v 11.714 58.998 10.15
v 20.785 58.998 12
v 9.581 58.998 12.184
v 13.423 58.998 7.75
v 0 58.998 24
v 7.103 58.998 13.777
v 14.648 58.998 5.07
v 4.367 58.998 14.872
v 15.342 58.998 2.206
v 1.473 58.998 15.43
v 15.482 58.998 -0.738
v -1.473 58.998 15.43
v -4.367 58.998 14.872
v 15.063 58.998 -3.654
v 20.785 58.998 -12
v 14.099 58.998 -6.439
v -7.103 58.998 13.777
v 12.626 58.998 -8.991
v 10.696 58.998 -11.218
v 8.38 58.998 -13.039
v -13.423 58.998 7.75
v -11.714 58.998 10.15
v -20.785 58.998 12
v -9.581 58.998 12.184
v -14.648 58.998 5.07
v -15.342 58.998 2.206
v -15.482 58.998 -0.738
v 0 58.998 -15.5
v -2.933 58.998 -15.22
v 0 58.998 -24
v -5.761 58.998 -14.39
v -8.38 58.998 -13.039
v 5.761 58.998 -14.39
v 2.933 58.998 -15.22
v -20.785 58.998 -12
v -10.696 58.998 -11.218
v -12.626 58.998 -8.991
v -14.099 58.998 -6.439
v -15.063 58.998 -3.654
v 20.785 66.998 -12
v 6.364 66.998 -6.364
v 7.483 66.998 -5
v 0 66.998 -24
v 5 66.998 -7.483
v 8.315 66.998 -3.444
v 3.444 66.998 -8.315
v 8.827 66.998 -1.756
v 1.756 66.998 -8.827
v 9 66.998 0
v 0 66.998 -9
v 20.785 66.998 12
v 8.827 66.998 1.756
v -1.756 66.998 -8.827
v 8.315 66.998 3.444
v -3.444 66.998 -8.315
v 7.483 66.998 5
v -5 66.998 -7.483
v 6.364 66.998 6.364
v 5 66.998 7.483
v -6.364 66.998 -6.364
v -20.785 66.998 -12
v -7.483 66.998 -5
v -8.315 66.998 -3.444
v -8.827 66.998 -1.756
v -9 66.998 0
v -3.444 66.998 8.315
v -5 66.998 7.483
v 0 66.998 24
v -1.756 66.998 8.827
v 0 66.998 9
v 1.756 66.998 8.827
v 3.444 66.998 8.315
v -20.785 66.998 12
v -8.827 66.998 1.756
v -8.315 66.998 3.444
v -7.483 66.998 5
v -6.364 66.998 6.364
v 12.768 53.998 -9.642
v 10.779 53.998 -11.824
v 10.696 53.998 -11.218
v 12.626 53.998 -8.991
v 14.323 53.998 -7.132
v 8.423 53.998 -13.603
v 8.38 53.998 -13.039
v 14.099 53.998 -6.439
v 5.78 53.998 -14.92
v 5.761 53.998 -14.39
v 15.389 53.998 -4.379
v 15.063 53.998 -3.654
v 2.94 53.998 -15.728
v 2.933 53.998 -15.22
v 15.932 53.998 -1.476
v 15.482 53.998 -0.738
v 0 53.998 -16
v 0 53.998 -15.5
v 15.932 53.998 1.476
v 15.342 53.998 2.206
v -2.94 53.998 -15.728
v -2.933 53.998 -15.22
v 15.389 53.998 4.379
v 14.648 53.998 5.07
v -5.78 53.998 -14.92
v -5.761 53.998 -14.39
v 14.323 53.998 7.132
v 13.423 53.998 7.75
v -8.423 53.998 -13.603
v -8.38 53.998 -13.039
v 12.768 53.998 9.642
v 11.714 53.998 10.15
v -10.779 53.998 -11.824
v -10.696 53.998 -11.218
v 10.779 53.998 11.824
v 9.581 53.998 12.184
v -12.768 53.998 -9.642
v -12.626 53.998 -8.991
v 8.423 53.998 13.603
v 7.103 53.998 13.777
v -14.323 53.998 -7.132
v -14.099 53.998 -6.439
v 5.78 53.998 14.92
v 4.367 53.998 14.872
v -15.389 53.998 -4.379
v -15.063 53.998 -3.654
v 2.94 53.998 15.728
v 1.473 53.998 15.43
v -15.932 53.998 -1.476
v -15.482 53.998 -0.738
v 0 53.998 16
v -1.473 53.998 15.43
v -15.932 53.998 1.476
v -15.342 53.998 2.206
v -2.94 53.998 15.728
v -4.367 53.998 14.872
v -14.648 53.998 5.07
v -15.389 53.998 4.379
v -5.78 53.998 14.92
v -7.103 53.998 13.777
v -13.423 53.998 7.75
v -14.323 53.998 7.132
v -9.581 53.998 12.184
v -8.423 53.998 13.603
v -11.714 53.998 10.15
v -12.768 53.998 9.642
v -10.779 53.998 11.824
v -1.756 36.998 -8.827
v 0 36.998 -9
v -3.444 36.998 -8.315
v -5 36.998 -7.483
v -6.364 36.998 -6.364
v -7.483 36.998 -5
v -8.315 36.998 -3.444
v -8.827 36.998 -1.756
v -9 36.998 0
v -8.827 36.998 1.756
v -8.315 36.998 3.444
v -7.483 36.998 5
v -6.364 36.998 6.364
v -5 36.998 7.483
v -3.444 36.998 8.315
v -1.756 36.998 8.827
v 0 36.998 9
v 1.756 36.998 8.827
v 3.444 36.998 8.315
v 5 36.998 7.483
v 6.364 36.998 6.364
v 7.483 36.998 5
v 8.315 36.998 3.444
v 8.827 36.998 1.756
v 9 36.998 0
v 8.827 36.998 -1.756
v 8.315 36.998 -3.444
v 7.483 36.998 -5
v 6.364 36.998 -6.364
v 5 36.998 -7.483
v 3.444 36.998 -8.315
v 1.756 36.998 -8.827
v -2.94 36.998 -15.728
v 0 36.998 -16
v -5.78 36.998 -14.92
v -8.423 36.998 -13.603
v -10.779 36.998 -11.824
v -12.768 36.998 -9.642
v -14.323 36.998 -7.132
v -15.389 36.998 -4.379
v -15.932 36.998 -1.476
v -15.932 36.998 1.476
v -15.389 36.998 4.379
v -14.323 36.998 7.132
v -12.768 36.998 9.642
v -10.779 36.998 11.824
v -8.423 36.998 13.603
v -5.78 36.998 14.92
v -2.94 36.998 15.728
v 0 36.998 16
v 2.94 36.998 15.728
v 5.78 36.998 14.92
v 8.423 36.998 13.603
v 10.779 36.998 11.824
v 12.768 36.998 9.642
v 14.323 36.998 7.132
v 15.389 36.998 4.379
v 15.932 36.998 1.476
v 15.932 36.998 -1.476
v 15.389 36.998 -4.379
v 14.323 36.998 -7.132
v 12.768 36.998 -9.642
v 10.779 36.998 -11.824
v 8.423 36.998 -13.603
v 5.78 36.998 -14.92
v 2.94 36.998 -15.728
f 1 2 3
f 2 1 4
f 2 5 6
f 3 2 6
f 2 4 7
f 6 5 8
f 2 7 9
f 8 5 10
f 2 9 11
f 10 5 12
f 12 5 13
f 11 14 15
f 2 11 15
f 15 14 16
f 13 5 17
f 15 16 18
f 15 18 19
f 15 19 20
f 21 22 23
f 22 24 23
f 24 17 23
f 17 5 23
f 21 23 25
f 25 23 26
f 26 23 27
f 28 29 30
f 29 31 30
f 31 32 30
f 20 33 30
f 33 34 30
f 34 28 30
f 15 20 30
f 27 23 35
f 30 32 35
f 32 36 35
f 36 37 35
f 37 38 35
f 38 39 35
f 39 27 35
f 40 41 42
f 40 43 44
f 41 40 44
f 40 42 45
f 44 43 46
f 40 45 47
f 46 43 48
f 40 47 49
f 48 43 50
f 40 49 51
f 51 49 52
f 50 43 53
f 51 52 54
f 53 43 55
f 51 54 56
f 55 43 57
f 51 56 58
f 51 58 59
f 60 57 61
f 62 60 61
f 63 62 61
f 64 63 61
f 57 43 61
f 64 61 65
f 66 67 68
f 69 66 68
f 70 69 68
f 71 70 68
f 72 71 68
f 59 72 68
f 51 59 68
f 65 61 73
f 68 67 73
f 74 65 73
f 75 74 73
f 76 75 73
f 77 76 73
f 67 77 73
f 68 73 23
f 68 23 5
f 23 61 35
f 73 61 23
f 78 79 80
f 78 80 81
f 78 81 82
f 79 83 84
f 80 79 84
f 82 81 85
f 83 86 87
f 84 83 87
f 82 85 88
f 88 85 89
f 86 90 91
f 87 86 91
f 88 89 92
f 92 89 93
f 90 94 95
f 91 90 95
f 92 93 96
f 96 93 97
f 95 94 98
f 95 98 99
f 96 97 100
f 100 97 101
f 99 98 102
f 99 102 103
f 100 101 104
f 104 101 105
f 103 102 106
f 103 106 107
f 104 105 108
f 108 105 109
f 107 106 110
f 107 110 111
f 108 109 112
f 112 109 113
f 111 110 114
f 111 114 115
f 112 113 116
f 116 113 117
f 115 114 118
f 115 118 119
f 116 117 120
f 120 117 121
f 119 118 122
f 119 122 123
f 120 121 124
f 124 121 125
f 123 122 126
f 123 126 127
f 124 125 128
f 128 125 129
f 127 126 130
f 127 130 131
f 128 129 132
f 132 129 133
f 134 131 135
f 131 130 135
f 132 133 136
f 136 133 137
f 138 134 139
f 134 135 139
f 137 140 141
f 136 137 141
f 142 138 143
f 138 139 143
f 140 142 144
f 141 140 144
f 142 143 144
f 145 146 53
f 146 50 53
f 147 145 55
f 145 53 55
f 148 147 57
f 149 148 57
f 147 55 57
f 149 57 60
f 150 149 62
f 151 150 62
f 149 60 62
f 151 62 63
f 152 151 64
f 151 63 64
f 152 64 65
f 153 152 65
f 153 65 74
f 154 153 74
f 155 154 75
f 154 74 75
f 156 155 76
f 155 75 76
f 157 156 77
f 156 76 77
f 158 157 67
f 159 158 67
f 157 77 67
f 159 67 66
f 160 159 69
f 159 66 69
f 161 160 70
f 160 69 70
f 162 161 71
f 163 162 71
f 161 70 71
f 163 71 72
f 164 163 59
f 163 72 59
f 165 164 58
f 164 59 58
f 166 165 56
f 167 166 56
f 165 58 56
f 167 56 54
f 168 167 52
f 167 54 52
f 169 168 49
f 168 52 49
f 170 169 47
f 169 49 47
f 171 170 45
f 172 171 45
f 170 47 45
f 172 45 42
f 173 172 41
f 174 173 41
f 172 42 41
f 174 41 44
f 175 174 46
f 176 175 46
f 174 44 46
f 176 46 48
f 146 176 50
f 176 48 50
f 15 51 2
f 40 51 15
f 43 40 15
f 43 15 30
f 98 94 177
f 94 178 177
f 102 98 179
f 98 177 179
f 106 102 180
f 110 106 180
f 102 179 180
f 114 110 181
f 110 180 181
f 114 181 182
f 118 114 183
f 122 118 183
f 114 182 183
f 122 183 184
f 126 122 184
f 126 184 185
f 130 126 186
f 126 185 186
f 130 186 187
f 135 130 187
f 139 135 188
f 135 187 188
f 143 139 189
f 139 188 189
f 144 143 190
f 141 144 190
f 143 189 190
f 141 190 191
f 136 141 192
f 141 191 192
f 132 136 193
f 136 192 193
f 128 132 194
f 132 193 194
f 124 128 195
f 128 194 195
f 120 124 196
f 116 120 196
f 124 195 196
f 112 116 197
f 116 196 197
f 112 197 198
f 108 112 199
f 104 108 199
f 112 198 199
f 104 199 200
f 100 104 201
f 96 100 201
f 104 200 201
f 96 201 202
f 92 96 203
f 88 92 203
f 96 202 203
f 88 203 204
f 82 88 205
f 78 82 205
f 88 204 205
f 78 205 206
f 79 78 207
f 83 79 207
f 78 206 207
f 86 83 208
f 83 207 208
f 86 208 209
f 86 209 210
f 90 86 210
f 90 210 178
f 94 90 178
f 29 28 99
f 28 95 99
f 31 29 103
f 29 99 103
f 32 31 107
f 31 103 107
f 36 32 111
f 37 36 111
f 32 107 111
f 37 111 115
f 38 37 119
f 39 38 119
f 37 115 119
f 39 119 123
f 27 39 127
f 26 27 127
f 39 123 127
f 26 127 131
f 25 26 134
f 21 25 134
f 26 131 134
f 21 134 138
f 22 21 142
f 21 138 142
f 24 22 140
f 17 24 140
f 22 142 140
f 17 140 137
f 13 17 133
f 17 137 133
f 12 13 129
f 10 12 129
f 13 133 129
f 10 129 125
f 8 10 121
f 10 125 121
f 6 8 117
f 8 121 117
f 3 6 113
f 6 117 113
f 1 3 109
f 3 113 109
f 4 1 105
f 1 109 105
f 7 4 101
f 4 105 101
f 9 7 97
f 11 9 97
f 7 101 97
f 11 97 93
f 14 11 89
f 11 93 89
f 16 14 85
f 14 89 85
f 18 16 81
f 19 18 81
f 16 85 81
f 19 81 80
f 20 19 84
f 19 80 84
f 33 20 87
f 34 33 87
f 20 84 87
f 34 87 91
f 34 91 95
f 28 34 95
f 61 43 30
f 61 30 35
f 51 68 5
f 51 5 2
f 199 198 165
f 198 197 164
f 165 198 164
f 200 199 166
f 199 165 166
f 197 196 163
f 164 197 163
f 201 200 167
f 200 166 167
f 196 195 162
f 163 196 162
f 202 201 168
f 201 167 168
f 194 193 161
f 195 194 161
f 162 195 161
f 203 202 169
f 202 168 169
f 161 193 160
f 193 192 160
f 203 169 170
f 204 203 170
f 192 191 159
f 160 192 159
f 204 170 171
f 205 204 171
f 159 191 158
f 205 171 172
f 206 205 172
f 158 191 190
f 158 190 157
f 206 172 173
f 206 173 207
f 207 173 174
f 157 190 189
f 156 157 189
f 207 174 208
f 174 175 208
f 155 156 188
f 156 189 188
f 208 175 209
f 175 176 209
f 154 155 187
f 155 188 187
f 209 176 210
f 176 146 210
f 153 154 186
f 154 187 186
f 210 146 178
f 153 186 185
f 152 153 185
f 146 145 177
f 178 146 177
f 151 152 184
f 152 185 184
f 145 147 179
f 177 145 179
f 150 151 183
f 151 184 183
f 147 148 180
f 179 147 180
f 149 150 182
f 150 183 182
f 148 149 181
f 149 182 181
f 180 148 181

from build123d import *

# Parameters (mm, degrees)
SKETCH2_R          = 28.855655256
CUT_EXTRUDE1_DEPTH = 10


with BuildPart() as part:
    # Sketch1 → Revolve1 (revolve)
    with BuildSketch(Plane.XY, mode=Mode.PRIVATE) as revolve1_sk:
        Polygon((-9, 66.99759887), (-24, 66.99759887), (-24, 58.99759887), (-15.5, 58.99759887), (-15.5, 53.99759887), (-16, 53.99759887), (-16, 36.99759887), (-9, 36.99759887), align=None)
    revolve(revolve1_sk.sketch.rotate(Axis((0, 0, 0), (0, 1, 0)), 270), axis=Axis((0, 0, 0), (0, 1, 0)))

    # Sketch2 → Cut-Extrude1 (cut)
    with BuildSketch(Plane(origin=(0, 66.99759887, 0), x_dir=(-1, 0, 0), z_dir=(0, 1, 0))):
        Circle(SKETCH2_R)
        Polygon((0, -24), (20.784609691, -12), (20.784609691, 12), (0, 24), (-20.784609691, 12), (-20.784609691, -12), align=None, mode=Mode.SUBTRACT)
    extrude(amount=-CUT_EXTRUDE1_DEPTH, mode=Mode.SUBTRACT)


solid = part.part
